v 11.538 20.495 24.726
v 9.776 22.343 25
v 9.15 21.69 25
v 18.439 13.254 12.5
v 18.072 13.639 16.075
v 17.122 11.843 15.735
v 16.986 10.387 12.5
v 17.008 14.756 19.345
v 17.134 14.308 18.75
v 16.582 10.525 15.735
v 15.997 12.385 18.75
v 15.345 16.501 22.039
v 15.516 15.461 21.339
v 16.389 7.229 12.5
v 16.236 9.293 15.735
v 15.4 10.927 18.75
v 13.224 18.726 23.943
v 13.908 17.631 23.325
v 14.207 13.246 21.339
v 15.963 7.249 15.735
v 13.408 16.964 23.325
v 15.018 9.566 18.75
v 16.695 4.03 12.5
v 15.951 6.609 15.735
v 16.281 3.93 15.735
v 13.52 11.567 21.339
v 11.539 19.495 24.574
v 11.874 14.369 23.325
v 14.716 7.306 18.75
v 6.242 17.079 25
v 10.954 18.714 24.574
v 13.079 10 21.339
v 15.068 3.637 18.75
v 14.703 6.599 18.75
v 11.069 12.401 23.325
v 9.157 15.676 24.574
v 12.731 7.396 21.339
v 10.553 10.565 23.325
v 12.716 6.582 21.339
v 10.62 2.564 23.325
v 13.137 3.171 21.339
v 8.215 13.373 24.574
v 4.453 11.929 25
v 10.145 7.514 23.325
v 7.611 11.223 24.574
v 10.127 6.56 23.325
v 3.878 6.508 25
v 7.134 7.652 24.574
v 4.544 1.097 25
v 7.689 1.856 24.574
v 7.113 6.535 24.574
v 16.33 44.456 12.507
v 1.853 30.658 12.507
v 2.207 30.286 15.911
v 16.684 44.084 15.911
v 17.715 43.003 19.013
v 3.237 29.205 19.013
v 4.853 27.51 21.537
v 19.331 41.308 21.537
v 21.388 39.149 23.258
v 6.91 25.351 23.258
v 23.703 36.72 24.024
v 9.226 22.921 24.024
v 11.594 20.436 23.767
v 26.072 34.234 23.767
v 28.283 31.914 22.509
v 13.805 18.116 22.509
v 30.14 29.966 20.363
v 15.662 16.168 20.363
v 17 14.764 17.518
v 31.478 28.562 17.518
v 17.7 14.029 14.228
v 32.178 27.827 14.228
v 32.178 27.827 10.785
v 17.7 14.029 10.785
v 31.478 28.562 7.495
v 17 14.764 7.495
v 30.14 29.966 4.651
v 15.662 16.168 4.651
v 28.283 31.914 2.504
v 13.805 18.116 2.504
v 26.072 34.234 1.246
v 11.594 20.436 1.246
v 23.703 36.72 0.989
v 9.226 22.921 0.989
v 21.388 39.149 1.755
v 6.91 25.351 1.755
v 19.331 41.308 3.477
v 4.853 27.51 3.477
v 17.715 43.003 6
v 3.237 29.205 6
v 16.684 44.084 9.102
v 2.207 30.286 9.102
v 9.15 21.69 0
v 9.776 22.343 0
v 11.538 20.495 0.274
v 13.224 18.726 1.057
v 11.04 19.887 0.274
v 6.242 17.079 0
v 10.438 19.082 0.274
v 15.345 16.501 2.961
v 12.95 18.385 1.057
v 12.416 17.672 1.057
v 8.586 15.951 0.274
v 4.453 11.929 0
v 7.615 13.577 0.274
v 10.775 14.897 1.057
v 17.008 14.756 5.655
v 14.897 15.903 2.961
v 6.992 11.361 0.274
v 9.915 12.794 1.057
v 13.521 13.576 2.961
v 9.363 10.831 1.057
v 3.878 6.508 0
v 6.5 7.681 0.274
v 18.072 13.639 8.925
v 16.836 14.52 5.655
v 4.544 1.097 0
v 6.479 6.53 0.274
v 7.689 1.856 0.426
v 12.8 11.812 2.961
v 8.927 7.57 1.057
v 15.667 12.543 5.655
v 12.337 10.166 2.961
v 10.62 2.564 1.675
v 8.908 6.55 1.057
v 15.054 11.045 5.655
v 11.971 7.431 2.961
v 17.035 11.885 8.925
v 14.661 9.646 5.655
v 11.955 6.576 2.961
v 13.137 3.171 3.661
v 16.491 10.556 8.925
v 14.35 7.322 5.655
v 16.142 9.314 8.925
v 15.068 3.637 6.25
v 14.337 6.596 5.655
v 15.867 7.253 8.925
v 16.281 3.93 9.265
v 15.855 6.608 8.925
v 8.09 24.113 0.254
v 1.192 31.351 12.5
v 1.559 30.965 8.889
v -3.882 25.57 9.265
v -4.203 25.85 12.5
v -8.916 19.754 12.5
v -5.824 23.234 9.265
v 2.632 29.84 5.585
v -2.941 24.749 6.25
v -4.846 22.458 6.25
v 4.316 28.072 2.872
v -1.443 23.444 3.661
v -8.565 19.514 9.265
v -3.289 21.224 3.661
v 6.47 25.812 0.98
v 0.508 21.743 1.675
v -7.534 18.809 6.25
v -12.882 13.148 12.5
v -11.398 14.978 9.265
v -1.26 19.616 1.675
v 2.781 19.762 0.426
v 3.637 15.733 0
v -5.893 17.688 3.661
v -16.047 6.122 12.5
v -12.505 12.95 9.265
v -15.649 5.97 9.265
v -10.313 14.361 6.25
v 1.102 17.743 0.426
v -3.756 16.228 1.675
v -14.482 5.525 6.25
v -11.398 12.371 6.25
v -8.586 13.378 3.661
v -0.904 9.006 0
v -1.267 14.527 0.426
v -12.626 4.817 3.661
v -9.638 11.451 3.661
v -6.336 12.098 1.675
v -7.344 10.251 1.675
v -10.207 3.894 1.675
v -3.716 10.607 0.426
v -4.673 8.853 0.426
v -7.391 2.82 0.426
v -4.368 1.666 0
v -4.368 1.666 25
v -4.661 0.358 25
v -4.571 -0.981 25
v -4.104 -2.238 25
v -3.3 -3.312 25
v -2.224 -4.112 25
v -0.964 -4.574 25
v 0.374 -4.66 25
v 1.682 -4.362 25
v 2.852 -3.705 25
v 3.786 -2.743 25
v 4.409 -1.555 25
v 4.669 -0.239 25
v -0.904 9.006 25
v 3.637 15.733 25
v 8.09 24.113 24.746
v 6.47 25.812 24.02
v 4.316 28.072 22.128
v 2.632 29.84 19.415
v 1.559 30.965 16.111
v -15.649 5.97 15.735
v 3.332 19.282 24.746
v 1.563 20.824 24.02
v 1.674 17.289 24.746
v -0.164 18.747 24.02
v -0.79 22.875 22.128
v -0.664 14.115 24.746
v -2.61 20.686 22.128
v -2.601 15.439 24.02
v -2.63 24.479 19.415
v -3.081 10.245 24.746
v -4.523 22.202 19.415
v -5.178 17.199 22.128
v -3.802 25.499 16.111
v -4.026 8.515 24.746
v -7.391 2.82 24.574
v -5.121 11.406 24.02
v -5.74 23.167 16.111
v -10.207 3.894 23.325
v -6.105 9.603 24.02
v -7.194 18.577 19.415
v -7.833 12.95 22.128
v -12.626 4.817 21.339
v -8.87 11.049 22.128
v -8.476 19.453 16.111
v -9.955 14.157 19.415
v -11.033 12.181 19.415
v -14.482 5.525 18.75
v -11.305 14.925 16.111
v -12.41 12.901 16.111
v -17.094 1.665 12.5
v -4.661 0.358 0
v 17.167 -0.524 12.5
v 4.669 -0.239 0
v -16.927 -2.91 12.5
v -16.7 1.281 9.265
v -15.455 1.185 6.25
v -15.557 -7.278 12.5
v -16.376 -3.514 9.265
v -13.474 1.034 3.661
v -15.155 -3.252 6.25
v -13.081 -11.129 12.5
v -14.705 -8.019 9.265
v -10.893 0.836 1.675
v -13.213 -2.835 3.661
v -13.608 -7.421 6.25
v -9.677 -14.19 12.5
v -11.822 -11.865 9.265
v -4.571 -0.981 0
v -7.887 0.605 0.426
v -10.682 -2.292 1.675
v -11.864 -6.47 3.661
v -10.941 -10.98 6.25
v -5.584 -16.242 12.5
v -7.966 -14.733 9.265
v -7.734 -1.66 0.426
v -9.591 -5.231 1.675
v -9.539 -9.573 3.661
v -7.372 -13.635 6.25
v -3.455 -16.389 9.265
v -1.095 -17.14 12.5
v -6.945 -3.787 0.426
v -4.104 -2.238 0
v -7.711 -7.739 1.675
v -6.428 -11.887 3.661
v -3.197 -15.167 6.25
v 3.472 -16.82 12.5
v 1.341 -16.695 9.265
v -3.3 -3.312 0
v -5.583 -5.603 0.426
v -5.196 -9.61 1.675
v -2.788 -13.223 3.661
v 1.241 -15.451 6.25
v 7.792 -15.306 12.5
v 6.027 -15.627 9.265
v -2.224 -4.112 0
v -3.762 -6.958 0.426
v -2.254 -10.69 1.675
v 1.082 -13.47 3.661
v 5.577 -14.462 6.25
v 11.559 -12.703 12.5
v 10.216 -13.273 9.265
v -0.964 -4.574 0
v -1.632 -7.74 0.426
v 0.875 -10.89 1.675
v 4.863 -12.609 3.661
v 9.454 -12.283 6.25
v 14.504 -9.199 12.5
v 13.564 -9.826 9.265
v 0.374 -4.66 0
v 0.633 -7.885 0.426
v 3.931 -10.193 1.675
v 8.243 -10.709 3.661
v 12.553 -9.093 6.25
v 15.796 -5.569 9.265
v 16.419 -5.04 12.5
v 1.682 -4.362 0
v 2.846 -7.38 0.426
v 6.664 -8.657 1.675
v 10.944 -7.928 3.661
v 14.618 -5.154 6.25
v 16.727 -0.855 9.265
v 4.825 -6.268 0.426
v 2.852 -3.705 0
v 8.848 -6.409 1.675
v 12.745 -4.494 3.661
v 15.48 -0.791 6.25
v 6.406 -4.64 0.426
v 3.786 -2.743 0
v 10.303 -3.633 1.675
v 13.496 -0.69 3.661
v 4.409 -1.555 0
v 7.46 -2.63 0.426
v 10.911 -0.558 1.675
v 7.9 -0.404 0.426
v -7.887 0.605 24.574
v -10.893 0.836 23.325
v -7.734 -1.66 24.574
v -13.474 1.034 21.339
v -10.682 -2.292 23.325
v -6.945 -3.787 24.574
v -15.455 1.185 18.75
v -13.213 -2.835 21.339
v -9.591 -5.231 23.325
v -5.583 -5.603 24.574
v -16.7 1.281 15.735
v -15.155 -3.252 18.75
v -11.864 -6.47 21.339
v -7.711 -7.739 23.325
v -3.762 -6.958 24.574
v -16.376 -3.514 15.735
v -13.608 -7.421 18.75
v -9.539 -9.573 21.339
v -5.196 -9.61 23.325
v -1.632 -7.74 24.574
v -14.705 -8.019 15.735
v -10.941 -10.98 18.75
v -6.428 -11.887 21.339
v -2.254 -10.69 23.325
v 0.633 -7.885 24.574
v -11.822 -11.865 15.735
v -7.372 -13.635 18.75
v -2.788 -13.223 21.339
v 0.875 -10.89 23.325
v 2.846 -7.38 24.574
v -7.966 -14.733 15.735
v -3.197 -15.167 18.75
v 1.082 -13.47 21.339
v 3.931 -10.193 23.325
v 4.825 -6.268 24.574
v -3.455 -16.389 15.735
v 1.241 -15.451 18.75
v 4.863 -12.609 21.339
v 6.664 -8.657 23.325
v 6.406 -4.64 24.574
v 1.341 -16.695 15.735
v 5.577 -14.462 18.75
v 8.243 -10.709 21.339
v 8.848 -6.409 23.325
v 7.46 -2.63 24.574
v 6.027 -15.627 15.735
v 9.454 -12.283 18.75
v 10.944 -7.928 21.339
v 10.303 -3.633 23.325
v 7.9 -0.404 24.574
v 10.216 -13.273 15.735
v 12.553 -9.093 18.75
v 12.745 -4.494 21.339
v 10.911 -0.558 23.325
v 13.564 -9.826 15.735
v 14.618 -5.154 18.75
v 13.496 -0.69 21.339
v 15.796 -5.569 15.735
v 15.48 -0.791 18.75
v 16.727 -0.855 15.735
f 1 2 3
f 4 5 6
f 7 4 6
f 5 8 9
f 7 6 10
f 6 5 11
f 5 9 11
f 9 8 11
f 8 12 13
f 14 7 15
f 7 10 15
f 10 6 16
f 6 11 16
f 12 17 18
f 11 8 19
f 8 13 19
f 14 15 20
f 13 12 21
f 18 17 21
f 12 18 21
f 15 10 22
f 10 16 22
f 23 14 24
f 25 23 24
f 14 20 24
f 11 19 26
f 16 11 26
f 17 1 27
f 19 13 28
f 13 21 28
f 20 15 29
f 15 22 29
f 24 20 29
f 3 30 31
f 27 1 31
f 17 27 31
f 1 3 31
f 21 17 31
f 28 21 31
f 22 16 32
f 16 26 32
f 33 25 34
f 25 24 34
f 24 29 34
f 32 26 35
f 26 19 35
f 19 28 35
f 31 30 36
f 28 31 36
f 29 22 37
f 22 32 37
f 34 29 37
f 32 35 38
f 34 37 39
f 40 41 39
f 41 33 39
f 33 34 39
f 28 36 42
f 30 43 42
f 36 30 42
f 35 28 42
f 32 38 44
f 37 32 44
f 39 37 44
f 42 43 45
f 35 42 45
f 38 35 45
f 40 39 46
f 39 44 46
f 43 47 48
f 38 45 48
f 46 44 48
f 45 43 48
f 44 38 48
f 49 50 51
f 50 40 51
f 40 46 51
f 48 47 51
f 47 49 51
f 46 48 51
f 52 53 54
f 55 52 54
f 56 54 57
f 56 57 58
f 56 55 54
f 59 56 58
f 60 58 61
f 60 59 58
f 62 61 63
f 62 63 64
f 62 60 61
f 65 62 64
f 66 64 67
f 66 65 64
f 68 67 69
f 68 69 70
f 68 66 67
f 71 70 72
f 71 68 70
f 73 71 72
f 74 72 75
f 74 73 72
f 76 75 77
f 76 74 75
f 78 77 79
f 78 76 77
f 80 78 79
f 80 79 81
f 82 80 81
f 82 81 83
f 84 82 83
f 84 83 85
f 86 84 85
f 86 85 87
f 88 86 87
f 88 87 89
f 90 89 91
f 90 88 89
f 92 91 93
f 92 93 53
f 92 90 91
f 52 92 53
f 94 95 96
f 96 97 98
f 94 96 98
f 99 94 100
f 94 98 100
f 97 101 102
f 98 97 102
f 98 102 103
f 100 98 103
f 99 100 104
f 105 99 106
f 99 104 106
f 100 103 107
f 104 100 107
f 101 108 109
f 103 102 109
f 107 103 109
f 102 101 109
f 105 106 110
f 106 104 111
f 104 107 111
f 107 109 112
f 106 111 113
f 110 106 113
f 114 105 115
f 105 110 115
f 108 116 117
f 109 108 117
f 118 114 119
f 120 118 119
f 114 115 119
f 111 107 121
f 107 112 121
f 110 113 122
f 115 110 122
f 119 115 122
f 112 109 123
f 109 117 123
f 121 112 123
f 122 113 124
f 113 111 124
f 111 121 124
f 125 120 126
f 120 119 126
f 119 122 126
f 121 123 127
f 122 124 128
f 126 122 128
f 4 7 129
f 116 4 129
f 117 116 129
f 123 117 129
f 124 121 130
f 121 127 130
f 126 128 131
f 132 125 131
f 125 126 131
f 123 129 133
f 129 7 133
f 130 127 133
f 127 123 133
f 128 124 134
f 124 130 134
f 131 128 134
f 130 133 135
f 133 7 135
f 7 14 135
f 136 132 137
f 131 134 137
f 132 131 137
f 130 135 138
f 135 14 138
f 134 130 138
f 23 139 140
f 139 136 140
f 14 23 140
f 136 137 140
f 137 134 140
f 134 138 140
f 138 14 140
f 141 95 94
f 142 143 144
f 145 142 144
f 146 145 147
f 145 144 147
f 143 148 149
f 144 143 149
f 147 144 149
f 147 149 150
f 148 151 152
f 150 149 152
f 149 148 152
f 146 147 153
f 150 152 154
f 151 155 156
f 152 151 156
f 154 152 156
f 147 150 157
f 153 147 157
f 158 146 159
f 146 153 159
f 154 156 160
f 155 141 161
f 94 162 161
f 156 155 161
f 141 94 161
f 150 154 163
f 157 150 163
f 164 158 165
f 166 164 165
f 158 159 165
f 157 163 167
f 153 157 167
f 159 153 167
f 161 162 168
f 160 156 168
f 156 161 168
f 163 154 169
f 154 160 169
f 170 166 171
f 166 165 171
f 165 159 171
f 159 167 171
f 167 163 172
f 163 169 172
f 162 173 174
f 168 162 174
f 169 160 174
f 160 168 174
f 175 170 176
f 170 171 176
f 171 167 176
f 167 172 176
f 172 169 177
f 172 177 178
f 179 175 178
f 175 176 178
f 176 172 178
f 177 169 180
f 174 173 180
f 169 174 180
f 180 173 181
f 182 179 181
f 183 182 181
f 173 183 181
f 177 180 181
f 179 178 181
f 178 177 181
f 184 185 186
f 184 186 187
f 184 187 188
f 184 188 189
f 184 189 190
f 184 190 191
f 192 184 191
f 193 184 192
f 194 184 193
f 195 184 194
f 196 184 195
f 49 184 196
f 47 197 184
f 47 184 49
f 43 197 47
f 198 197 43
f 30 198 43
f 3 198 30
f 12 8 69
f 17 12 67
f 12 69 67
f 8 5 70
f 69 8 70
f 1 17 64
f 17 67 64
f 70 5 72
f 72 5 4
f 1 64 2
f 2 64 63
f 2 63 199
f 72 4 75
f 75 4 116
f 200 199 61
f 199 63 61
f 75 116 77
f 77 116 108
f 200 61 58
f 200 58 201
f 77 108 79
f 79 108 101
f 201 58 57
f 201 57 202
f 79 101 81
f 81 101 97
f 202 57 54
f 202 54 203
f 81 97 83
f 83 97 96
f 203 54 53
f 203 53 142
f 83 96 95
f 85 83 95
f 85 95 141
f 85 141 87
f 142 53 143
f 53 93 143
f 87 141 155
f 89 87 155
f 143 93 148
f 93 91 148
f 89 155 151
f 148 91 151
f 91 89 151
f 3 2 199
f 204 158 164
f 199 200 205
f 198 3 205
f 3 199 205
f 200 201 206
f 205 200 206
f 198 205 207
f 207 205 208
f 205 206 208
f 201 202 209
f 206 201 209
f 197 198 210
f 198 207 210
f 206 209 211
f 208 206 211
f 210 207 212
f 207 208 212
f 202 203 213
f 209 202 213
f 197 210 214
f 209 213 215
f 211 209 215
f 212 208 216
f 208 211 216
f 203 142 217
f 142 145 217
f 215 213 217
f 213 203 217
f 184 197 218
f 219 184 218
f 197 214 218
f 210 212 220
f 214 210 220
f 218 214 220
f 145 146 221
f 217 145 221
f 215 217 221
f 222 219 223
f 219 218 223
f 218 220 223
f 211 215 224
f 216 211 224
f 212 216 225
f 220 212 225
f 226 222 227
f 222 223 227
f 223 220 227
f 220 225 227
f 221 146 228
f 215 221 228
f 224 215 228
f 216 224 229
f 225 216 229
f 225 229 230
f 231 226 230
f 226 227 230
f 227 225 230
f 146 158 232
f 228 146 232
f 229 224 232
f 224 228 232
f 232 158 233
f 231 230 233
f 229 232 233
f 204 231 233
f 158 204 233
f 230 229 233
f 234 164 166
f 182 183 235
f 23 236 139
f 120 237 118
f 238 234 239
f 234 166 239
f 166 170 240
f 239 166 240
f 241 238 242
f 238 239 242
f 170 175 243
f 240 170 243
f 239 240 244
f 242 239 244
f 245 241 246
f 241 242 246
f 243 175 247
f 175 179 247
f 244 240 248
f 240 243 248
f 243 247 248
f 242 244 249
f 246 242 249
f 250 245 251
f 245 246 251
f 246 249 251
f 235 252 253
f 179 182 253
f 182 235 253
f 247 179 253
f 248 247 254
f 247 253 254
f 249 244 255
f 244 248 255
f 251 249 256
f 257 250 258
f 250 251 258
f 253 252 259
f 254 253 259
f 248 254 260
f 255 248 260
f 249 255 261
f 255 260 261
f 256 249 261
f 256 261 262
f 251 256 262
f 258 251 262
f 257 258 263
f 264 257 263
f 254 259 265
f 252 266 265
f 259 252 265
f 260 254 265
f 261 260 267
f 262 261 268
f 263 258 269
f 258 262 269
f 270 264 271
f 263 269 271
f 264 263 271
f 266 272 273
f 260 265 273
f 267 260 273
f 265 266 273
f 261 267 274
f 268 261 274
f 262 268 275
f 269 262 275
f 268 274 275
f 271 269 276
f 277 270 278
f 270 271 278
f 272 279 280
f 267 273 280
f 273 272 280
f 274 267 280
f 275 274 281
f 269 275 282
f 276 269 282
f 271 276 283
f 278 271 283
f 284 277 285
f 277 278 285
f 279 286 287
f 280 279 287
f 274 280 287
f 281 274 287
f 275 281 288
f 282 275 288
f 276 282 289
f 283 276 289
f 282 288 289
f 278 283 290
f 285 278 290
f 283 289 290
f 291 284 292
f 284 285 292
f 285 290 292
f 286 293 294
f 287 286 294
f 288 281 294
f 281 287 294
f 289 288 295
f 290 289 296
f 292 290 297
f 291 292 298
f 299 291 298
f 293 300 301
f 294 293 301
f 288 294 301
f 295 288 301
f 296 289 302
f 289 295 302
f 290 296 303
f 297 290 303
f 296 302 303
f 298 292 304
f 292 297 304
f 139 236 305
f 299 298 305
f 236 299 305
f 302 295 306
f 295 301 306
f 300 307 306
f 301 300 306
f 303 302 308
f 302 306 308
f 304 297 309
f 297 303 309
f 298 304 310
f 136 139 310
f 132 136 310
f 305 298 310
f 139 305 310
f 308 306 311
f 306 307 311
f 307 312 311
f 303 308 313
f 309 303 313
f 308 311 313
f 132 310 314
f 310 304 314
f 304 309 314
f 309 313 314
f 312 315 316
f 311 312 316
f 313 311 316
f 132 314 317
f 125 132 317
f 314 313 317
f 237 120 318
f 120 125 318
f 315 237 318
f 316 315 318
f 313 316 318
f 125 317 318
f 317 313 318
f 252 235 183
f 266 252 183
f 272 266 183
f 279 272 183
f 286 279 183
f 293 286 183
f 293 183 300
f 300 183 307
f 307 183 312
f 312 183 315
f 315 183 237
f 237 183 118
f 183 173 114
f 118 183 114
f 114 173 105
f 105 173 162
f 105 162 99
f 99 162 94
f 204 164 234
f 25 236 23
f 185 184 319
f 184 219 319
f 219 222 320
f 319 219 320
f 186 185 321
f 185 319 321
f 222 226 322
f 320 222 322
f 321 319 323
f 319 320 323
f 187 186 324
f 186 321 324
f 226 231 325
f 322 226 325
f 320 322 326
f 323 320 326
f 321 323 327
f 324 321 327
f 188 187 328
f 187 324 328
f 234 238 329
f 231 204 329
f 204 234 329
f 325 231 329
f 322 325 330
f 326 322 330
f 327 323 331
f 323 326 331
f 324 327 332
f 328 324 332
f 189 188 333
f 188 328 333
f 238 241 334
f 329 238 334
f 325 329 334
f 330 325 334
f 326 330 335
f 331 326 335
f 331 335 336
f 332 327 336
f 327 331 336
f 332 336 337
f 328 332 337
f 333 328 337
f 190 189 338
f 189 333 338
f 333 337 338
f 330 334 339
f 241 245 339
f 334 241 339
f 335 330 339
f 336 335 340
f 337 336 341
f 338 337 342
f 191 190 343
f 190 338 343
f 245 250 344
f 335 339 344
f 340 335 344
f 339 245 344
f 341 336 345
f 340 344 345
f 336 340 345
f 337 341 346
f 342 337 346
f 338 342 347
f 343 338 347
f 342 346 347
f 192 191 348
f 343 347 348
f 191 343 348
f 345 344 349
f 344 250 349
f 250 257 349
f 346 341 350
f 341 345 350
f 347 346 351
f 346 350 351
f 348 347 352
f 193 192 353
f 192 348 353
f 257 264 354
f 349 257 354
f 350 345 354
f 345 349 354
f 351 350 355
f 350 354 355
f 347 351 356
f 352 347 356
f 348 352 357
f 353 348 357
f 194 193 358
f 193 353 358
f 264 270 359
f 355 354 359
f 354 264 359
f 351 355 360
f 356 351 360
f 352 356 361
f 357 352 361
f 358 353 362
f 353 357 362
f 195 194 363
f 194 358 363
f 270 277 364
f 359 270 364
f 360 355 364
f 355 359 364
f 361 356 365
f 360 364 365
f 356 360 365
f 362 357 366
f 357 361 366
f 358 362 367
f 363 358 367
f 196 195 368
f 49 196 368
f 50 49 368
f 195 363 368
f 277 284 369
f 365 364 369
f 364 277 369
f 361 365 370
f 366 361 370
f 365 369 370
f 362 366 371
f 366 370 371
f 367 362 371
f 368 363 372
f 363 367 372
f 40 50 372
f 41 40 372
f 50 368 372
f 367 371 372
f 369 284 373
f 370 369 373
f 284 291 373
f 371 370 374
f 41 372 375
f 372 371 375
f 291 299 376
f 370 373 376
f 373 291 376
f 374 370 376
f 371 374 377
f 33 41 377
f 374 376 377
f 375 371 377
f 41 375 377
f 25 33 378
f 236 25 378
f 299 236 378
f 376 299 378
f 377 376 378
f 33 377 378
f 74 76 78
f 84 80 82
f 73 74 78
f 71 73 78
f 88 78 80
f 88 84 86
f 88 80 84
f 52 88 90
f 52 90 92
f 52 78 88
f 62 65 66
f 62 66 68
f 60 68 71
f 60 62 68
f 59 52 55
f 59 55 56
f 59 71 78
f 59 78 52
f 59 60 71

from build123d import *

# Parameters (mm, degrees)
BOSS_EXTRUDE1_DEPTH = 25
FILLET1_ANGLE       = 27.256571
FILLET1_2_ANGLE     = 214.454112
FILLET1_3_ANGLE     = 54.523986
BOSS_EXTRUDE2_DEPTH = 20
SKETCH4_R           = 11.55
BOSS_EXTRUDE3_DEPTH = 20


with BuildPart() as part:
    # Sketch2 → Boss-Extrude1 (new body)
    with BuildSketch(Plane.XY):
        with BuildLine():
            ThreePointArc((16.695481749, 4.030209956), (16.575469403, 8.82948354), (18.439335728, 13.253670723))
            Line((18.439335728, 13.253670723), (1.191582265, 31.351046237))
            ThreePointArc((1.191582265, 31.351046237), (-8.916313316, 19.75380413), (-16.046827969, 6.122174061))
            ThreePointArc((-16.046827969, 6.122174061), (-1.095110216, -17.140082752), (16.695481749, 4.030209956))
        make_face()
    extrude(amount=BOSS_EXTRUDE1_DEPTH)

    # Fillet1: read off the stored shape, not the designer's step
    # Fillet1 outline → Fillet1 (revolve, cut)
    with BuildSketch(Plane(origin=(45.27231793, -17.272260647, 0), x_dir=(-0.6673207357903113, 0.7447704583187209, 0), z_dir=(0.7447704583187209, 0.6673207357903113, 0))):
        with BuildLine():
            ThreePointArc((65.630307245, 12.5), (61.96914201, 3.661165235), (53.130307245, 0))
            Line((53.130307245, 0), (65.630307245, 0))
            Line((65.630307245, 0), (65.630307245, 12.5))
        make_face()
        with BuildLine():
            ThreePointArc((53.130307245, 25), (61.96914201, 21.338834765), (65.630307245, 12.5))
            Line((65.630307245, 12.5), (65.630307245, 25))
            Line((65.630307245, 25), (53.130307245, 25))
        make_face()
    revolve(axis=Axis((45.27231793, -17.272260647, 0), (0, 0, 1)), revolution_arc=FILLET1_ANGLE, mode=Mode.SUBTRACT)

    # Fillet1 2 outline → Fillet1 2 (revolve, cut)
    with BuildSketch(Plane(origin=(0, 0, 0), x_dir=(-0.9343114269174442, 0.356457792075709, 0), z_dir=(0.356457792075709, 0.9343114269174442, 0))):
        with BuildLine():
            ThreePointArc((17.175031386, 12.5), (13.513866151, 3.661165235), (4.675031386, 0))
            Line((4.675031386, 0), (17.175031386, 0))
            Line((17.175031386, 0), (17.175031386, 12.5))
        make_face()
        with BuildLine():
            ThreePointArc((4.675031386, 25), (13.513866151, 21.338834765), (17.175031386, 12.5))
            Line((17.175031386, 12.5), (17.175031386, 25))
            Line((17.175031386, 25), (4.675031386, 25))
        make_face()
    revolve(axis=Axis((0, 0, 0), (0, 0, 1)), revolution_arc=FILLET1_2_ANGLE, mode=Mode.SUBTRACT)

    # Fillet1 3 outline → Fillet1 3 (revolve, cut)
    with BuildSketch(Plane(origin=(27.791881525, 6.708827813, 0), x_dir=(-0.755251050967347, 0.6554356185108632, 0), z_dir=(0.6554356185108632, 0.755251050967347, 0))):
        with BuildLine():
            ThreePointArc((23.915125125, 0), (15.07629036, 3.661165235), (11.415125125, 12.5))
            ThreePointArc((11.415125125, 12.5), (15.07629036, 21.338834765), (23.915125125, 25))
            Line((23.915125125, 25), (0, 25))
            Line((0, 25), (0, 0))
            Line((0, 0), (23.915125125, 0))
        make_face()
    revolve(axis=Axis((27.791881525, 6.708827813, 0), (0, 0, 1)), revolution_arc=FILLET1_3_ANGLE, mode=Mode.SUBTRACT)

    # Sketch3 → Boss-Extrude2 (add)
    with BuildSketch(Plane(origin=(16.28183603, 15.51744857, 0), x_dir=(0, 0, -1), z_dir=(0.7238950205462975, 0.689910138516804, 0))):
        with BuildLine():
            add(Edge.make_bspline(
                [(-12.5, 20.872781575), (-13.256668139, 20.872783302), (-14.000739855, 20.79881073), (-15.098725324, 20.581427208), (-15.461678458, 20.491101322), (-16.181362745, 20.273910071), (-16.539184388, 20.146395237), (-17.580284009, 19.716702167), (-18.238808791, 19.366085439), (-19.173819976, 18.744896669), (-19.477482866, 18.521152694), (-20.062713338, 18.043490327), (-20.341290031, 17.792156843), (-21.136253577, 17.00185096), (-21.612268684, 16.426924712), (-22.24356028, 15.490857573), (-22.440003661, 15.166129183), (-22.796391307, 14.50612924), (-23.1187343, 13.832119756), (-23.37417024, 13.130577693), (-23.595730444, 12.415095599), (-23.689852392, 12.048946993), (-23.917308897, 10.939216126), (-23.995503885, 10.191000747), (-23.999860972, 9.434345392)],
                knots=[0, 0, 0, 0, 0.125, 0.125, 0.1875, 0.1875, 0.25, 0.25, 0.375, 0.375, 0.4375, 0.4375, 0.5, 0.5, 0.625, 0.625, 0.6875, 0.6875, 0.75, 0.8125, 0.8125, 0.875, 0.875, 1, 1, 1, 1], degree=3))
            add(Edge.make_bspline(
                [(-23.999860972, 9.434345392), (-23.996140108, 8.673949048), (-23.918521624, 7.926531477), (-23.696119049, 6.824017675), (-23.604194154, 6.459637687), (-23.384046374, 5.737252794), (-23.255109601, 5.377966861), (-22.821299038, 4.332097389), (-22.4684037, 3.670544318), (-21.636877733, 2.417904815), (-21.153165557, 1.82340781), (-20.096391068, 0.75538362), (-19.520332011, 0.275442623), (-18.583042659, -0.36144191), (-18.257210639, -0.560332334), (-17.59457102, -0.920958023), (-17.256263168, -1.083852584), (-16.22099128, -1.521816354), (-15.502186237, -1.746448083), (-14.013070638, -2.050842838), (-13.260547219, -2.127218425), (-12.5, -2.127218425)],
                knots=[0, 0, 0, 0, 0.125, 0.125, 0.1875, 0.1875, 0.25, 0.25, 0.375, 0.375, 0.5, 0.5, 0.625, 0.625, 0.6875, 0.6875, 0.75, 0.75, 0.875, 0.875, 1, 1, 1, 1], degree=3))
            add(Edge.make_bspline(
                [(-12.5, -2.127218425), (-11.739951783, -2.127220159), (-10.99298274, -2.050953602), (-9.891243761, -1.827423826), (-9.527138939, -1.734594918), (-8.805330439, -1.511610249), (-8.447027671, -1.380955069), (-7.405368997, -0.941566343), (-6.746852838, -0.583764468), (-5.812080094, 0.048657861), (-5.507990701, 0.276728473), (-4.925203492, 0.760295915), (-4.647677713, 1.014556559), (-3.855417752, 1.813612152), (-3.380608745, 2.394327897), (-2.750542265, 3.339309437), (-2.555352052, 3.665512733), (-2.200634738, 4.328941881), (-1.879486858, 5.006483662), (-1.62461868, 5.711889515), (-1.403437836, 6.431457566), (-1.309384468, 6.800035835), (-1.082652346, 7.913685357), (-1.004493644, 8.664749127), (-1.000138932, 9.42453918)],
                knots=[0, 0, 0, 0, 0.125, 0.125, 0.1875, 0.1875, 0.25, 0.25, 0.375, 0.375, 0.4375, 0.4375, 0.5, 0.5, 0.625, 0.625, 0.6875, 0.6875, 0.75, 0.8125, 0.8125, 0.875, 0.875, 1, 1, 1, 1], degree=3))
            add(Edge.make_bspline(
                [(-1.000138932, 9.42453918), (-1.003858377, 10.181599932), (-1.120284499, 11.297746686), (-1.396152663, 12.38592469), (-1.616837561, 13.104926142), (-1.746226262, 13.462294055), (-2.181078725, 14.502028599), (-2.534976545, 15.159282124), (-3.160808146, 16.091874442), (-3.385907391, 16.394636796), (-3.866661712, 16.978055074), (-4.119570523, 17.255527322), (-4.914129627, 18.047235479), (-5.491646985, 18.520723725), (-6.431186182, 19.147723677), (-6.757046383, 19.342774236), (-7.419230774, 19.696069822), (-7.757263319, 19.855548502), (-8.446848802, 20.141058966), (-8.798379325, 20.267146202), (-9.515296315, 20.485043686), (-9.882061099, 20.577108914), (-10.993778189, 20.798707299), (-11.742885367, 20.872781575), (-12.5, 20.872781575)],
                knots=[0, 0, 0, 0, 0.125, 0.1875, 0.1875, 0.25, 0.25, 0.375, 0.375, 0.4375, 0.4375, 0.5, 0.5, 0.625, 0.625, 0.6875, 0.6875, 0.75, 0.75, 0.8125, 0.8125, 0.875, 0.875, 1, 1, 1, 1], degree=3))
        make_face()
    extrude(amount=BOSS_EXTRUDE2_DEPTH)

    # Sketch4 → Boss-Extrude3 (add)
    with BuildSketch(Plane(origin=(30.759736441, 29.31565134, 0), x_dir=(0, 0, -1), z_dir=(0.7238950205462988, 0.6899101385168025, 4.126088551647398e-14))):
        with Locations(Location((-12.506772123, 9.364766291, 0), (0, 0, 90))):
            Circle(SKETCH4_R)
    extrude(amount=-BOSS_EXTRUDE3_DEPTH)


solid = part.part
